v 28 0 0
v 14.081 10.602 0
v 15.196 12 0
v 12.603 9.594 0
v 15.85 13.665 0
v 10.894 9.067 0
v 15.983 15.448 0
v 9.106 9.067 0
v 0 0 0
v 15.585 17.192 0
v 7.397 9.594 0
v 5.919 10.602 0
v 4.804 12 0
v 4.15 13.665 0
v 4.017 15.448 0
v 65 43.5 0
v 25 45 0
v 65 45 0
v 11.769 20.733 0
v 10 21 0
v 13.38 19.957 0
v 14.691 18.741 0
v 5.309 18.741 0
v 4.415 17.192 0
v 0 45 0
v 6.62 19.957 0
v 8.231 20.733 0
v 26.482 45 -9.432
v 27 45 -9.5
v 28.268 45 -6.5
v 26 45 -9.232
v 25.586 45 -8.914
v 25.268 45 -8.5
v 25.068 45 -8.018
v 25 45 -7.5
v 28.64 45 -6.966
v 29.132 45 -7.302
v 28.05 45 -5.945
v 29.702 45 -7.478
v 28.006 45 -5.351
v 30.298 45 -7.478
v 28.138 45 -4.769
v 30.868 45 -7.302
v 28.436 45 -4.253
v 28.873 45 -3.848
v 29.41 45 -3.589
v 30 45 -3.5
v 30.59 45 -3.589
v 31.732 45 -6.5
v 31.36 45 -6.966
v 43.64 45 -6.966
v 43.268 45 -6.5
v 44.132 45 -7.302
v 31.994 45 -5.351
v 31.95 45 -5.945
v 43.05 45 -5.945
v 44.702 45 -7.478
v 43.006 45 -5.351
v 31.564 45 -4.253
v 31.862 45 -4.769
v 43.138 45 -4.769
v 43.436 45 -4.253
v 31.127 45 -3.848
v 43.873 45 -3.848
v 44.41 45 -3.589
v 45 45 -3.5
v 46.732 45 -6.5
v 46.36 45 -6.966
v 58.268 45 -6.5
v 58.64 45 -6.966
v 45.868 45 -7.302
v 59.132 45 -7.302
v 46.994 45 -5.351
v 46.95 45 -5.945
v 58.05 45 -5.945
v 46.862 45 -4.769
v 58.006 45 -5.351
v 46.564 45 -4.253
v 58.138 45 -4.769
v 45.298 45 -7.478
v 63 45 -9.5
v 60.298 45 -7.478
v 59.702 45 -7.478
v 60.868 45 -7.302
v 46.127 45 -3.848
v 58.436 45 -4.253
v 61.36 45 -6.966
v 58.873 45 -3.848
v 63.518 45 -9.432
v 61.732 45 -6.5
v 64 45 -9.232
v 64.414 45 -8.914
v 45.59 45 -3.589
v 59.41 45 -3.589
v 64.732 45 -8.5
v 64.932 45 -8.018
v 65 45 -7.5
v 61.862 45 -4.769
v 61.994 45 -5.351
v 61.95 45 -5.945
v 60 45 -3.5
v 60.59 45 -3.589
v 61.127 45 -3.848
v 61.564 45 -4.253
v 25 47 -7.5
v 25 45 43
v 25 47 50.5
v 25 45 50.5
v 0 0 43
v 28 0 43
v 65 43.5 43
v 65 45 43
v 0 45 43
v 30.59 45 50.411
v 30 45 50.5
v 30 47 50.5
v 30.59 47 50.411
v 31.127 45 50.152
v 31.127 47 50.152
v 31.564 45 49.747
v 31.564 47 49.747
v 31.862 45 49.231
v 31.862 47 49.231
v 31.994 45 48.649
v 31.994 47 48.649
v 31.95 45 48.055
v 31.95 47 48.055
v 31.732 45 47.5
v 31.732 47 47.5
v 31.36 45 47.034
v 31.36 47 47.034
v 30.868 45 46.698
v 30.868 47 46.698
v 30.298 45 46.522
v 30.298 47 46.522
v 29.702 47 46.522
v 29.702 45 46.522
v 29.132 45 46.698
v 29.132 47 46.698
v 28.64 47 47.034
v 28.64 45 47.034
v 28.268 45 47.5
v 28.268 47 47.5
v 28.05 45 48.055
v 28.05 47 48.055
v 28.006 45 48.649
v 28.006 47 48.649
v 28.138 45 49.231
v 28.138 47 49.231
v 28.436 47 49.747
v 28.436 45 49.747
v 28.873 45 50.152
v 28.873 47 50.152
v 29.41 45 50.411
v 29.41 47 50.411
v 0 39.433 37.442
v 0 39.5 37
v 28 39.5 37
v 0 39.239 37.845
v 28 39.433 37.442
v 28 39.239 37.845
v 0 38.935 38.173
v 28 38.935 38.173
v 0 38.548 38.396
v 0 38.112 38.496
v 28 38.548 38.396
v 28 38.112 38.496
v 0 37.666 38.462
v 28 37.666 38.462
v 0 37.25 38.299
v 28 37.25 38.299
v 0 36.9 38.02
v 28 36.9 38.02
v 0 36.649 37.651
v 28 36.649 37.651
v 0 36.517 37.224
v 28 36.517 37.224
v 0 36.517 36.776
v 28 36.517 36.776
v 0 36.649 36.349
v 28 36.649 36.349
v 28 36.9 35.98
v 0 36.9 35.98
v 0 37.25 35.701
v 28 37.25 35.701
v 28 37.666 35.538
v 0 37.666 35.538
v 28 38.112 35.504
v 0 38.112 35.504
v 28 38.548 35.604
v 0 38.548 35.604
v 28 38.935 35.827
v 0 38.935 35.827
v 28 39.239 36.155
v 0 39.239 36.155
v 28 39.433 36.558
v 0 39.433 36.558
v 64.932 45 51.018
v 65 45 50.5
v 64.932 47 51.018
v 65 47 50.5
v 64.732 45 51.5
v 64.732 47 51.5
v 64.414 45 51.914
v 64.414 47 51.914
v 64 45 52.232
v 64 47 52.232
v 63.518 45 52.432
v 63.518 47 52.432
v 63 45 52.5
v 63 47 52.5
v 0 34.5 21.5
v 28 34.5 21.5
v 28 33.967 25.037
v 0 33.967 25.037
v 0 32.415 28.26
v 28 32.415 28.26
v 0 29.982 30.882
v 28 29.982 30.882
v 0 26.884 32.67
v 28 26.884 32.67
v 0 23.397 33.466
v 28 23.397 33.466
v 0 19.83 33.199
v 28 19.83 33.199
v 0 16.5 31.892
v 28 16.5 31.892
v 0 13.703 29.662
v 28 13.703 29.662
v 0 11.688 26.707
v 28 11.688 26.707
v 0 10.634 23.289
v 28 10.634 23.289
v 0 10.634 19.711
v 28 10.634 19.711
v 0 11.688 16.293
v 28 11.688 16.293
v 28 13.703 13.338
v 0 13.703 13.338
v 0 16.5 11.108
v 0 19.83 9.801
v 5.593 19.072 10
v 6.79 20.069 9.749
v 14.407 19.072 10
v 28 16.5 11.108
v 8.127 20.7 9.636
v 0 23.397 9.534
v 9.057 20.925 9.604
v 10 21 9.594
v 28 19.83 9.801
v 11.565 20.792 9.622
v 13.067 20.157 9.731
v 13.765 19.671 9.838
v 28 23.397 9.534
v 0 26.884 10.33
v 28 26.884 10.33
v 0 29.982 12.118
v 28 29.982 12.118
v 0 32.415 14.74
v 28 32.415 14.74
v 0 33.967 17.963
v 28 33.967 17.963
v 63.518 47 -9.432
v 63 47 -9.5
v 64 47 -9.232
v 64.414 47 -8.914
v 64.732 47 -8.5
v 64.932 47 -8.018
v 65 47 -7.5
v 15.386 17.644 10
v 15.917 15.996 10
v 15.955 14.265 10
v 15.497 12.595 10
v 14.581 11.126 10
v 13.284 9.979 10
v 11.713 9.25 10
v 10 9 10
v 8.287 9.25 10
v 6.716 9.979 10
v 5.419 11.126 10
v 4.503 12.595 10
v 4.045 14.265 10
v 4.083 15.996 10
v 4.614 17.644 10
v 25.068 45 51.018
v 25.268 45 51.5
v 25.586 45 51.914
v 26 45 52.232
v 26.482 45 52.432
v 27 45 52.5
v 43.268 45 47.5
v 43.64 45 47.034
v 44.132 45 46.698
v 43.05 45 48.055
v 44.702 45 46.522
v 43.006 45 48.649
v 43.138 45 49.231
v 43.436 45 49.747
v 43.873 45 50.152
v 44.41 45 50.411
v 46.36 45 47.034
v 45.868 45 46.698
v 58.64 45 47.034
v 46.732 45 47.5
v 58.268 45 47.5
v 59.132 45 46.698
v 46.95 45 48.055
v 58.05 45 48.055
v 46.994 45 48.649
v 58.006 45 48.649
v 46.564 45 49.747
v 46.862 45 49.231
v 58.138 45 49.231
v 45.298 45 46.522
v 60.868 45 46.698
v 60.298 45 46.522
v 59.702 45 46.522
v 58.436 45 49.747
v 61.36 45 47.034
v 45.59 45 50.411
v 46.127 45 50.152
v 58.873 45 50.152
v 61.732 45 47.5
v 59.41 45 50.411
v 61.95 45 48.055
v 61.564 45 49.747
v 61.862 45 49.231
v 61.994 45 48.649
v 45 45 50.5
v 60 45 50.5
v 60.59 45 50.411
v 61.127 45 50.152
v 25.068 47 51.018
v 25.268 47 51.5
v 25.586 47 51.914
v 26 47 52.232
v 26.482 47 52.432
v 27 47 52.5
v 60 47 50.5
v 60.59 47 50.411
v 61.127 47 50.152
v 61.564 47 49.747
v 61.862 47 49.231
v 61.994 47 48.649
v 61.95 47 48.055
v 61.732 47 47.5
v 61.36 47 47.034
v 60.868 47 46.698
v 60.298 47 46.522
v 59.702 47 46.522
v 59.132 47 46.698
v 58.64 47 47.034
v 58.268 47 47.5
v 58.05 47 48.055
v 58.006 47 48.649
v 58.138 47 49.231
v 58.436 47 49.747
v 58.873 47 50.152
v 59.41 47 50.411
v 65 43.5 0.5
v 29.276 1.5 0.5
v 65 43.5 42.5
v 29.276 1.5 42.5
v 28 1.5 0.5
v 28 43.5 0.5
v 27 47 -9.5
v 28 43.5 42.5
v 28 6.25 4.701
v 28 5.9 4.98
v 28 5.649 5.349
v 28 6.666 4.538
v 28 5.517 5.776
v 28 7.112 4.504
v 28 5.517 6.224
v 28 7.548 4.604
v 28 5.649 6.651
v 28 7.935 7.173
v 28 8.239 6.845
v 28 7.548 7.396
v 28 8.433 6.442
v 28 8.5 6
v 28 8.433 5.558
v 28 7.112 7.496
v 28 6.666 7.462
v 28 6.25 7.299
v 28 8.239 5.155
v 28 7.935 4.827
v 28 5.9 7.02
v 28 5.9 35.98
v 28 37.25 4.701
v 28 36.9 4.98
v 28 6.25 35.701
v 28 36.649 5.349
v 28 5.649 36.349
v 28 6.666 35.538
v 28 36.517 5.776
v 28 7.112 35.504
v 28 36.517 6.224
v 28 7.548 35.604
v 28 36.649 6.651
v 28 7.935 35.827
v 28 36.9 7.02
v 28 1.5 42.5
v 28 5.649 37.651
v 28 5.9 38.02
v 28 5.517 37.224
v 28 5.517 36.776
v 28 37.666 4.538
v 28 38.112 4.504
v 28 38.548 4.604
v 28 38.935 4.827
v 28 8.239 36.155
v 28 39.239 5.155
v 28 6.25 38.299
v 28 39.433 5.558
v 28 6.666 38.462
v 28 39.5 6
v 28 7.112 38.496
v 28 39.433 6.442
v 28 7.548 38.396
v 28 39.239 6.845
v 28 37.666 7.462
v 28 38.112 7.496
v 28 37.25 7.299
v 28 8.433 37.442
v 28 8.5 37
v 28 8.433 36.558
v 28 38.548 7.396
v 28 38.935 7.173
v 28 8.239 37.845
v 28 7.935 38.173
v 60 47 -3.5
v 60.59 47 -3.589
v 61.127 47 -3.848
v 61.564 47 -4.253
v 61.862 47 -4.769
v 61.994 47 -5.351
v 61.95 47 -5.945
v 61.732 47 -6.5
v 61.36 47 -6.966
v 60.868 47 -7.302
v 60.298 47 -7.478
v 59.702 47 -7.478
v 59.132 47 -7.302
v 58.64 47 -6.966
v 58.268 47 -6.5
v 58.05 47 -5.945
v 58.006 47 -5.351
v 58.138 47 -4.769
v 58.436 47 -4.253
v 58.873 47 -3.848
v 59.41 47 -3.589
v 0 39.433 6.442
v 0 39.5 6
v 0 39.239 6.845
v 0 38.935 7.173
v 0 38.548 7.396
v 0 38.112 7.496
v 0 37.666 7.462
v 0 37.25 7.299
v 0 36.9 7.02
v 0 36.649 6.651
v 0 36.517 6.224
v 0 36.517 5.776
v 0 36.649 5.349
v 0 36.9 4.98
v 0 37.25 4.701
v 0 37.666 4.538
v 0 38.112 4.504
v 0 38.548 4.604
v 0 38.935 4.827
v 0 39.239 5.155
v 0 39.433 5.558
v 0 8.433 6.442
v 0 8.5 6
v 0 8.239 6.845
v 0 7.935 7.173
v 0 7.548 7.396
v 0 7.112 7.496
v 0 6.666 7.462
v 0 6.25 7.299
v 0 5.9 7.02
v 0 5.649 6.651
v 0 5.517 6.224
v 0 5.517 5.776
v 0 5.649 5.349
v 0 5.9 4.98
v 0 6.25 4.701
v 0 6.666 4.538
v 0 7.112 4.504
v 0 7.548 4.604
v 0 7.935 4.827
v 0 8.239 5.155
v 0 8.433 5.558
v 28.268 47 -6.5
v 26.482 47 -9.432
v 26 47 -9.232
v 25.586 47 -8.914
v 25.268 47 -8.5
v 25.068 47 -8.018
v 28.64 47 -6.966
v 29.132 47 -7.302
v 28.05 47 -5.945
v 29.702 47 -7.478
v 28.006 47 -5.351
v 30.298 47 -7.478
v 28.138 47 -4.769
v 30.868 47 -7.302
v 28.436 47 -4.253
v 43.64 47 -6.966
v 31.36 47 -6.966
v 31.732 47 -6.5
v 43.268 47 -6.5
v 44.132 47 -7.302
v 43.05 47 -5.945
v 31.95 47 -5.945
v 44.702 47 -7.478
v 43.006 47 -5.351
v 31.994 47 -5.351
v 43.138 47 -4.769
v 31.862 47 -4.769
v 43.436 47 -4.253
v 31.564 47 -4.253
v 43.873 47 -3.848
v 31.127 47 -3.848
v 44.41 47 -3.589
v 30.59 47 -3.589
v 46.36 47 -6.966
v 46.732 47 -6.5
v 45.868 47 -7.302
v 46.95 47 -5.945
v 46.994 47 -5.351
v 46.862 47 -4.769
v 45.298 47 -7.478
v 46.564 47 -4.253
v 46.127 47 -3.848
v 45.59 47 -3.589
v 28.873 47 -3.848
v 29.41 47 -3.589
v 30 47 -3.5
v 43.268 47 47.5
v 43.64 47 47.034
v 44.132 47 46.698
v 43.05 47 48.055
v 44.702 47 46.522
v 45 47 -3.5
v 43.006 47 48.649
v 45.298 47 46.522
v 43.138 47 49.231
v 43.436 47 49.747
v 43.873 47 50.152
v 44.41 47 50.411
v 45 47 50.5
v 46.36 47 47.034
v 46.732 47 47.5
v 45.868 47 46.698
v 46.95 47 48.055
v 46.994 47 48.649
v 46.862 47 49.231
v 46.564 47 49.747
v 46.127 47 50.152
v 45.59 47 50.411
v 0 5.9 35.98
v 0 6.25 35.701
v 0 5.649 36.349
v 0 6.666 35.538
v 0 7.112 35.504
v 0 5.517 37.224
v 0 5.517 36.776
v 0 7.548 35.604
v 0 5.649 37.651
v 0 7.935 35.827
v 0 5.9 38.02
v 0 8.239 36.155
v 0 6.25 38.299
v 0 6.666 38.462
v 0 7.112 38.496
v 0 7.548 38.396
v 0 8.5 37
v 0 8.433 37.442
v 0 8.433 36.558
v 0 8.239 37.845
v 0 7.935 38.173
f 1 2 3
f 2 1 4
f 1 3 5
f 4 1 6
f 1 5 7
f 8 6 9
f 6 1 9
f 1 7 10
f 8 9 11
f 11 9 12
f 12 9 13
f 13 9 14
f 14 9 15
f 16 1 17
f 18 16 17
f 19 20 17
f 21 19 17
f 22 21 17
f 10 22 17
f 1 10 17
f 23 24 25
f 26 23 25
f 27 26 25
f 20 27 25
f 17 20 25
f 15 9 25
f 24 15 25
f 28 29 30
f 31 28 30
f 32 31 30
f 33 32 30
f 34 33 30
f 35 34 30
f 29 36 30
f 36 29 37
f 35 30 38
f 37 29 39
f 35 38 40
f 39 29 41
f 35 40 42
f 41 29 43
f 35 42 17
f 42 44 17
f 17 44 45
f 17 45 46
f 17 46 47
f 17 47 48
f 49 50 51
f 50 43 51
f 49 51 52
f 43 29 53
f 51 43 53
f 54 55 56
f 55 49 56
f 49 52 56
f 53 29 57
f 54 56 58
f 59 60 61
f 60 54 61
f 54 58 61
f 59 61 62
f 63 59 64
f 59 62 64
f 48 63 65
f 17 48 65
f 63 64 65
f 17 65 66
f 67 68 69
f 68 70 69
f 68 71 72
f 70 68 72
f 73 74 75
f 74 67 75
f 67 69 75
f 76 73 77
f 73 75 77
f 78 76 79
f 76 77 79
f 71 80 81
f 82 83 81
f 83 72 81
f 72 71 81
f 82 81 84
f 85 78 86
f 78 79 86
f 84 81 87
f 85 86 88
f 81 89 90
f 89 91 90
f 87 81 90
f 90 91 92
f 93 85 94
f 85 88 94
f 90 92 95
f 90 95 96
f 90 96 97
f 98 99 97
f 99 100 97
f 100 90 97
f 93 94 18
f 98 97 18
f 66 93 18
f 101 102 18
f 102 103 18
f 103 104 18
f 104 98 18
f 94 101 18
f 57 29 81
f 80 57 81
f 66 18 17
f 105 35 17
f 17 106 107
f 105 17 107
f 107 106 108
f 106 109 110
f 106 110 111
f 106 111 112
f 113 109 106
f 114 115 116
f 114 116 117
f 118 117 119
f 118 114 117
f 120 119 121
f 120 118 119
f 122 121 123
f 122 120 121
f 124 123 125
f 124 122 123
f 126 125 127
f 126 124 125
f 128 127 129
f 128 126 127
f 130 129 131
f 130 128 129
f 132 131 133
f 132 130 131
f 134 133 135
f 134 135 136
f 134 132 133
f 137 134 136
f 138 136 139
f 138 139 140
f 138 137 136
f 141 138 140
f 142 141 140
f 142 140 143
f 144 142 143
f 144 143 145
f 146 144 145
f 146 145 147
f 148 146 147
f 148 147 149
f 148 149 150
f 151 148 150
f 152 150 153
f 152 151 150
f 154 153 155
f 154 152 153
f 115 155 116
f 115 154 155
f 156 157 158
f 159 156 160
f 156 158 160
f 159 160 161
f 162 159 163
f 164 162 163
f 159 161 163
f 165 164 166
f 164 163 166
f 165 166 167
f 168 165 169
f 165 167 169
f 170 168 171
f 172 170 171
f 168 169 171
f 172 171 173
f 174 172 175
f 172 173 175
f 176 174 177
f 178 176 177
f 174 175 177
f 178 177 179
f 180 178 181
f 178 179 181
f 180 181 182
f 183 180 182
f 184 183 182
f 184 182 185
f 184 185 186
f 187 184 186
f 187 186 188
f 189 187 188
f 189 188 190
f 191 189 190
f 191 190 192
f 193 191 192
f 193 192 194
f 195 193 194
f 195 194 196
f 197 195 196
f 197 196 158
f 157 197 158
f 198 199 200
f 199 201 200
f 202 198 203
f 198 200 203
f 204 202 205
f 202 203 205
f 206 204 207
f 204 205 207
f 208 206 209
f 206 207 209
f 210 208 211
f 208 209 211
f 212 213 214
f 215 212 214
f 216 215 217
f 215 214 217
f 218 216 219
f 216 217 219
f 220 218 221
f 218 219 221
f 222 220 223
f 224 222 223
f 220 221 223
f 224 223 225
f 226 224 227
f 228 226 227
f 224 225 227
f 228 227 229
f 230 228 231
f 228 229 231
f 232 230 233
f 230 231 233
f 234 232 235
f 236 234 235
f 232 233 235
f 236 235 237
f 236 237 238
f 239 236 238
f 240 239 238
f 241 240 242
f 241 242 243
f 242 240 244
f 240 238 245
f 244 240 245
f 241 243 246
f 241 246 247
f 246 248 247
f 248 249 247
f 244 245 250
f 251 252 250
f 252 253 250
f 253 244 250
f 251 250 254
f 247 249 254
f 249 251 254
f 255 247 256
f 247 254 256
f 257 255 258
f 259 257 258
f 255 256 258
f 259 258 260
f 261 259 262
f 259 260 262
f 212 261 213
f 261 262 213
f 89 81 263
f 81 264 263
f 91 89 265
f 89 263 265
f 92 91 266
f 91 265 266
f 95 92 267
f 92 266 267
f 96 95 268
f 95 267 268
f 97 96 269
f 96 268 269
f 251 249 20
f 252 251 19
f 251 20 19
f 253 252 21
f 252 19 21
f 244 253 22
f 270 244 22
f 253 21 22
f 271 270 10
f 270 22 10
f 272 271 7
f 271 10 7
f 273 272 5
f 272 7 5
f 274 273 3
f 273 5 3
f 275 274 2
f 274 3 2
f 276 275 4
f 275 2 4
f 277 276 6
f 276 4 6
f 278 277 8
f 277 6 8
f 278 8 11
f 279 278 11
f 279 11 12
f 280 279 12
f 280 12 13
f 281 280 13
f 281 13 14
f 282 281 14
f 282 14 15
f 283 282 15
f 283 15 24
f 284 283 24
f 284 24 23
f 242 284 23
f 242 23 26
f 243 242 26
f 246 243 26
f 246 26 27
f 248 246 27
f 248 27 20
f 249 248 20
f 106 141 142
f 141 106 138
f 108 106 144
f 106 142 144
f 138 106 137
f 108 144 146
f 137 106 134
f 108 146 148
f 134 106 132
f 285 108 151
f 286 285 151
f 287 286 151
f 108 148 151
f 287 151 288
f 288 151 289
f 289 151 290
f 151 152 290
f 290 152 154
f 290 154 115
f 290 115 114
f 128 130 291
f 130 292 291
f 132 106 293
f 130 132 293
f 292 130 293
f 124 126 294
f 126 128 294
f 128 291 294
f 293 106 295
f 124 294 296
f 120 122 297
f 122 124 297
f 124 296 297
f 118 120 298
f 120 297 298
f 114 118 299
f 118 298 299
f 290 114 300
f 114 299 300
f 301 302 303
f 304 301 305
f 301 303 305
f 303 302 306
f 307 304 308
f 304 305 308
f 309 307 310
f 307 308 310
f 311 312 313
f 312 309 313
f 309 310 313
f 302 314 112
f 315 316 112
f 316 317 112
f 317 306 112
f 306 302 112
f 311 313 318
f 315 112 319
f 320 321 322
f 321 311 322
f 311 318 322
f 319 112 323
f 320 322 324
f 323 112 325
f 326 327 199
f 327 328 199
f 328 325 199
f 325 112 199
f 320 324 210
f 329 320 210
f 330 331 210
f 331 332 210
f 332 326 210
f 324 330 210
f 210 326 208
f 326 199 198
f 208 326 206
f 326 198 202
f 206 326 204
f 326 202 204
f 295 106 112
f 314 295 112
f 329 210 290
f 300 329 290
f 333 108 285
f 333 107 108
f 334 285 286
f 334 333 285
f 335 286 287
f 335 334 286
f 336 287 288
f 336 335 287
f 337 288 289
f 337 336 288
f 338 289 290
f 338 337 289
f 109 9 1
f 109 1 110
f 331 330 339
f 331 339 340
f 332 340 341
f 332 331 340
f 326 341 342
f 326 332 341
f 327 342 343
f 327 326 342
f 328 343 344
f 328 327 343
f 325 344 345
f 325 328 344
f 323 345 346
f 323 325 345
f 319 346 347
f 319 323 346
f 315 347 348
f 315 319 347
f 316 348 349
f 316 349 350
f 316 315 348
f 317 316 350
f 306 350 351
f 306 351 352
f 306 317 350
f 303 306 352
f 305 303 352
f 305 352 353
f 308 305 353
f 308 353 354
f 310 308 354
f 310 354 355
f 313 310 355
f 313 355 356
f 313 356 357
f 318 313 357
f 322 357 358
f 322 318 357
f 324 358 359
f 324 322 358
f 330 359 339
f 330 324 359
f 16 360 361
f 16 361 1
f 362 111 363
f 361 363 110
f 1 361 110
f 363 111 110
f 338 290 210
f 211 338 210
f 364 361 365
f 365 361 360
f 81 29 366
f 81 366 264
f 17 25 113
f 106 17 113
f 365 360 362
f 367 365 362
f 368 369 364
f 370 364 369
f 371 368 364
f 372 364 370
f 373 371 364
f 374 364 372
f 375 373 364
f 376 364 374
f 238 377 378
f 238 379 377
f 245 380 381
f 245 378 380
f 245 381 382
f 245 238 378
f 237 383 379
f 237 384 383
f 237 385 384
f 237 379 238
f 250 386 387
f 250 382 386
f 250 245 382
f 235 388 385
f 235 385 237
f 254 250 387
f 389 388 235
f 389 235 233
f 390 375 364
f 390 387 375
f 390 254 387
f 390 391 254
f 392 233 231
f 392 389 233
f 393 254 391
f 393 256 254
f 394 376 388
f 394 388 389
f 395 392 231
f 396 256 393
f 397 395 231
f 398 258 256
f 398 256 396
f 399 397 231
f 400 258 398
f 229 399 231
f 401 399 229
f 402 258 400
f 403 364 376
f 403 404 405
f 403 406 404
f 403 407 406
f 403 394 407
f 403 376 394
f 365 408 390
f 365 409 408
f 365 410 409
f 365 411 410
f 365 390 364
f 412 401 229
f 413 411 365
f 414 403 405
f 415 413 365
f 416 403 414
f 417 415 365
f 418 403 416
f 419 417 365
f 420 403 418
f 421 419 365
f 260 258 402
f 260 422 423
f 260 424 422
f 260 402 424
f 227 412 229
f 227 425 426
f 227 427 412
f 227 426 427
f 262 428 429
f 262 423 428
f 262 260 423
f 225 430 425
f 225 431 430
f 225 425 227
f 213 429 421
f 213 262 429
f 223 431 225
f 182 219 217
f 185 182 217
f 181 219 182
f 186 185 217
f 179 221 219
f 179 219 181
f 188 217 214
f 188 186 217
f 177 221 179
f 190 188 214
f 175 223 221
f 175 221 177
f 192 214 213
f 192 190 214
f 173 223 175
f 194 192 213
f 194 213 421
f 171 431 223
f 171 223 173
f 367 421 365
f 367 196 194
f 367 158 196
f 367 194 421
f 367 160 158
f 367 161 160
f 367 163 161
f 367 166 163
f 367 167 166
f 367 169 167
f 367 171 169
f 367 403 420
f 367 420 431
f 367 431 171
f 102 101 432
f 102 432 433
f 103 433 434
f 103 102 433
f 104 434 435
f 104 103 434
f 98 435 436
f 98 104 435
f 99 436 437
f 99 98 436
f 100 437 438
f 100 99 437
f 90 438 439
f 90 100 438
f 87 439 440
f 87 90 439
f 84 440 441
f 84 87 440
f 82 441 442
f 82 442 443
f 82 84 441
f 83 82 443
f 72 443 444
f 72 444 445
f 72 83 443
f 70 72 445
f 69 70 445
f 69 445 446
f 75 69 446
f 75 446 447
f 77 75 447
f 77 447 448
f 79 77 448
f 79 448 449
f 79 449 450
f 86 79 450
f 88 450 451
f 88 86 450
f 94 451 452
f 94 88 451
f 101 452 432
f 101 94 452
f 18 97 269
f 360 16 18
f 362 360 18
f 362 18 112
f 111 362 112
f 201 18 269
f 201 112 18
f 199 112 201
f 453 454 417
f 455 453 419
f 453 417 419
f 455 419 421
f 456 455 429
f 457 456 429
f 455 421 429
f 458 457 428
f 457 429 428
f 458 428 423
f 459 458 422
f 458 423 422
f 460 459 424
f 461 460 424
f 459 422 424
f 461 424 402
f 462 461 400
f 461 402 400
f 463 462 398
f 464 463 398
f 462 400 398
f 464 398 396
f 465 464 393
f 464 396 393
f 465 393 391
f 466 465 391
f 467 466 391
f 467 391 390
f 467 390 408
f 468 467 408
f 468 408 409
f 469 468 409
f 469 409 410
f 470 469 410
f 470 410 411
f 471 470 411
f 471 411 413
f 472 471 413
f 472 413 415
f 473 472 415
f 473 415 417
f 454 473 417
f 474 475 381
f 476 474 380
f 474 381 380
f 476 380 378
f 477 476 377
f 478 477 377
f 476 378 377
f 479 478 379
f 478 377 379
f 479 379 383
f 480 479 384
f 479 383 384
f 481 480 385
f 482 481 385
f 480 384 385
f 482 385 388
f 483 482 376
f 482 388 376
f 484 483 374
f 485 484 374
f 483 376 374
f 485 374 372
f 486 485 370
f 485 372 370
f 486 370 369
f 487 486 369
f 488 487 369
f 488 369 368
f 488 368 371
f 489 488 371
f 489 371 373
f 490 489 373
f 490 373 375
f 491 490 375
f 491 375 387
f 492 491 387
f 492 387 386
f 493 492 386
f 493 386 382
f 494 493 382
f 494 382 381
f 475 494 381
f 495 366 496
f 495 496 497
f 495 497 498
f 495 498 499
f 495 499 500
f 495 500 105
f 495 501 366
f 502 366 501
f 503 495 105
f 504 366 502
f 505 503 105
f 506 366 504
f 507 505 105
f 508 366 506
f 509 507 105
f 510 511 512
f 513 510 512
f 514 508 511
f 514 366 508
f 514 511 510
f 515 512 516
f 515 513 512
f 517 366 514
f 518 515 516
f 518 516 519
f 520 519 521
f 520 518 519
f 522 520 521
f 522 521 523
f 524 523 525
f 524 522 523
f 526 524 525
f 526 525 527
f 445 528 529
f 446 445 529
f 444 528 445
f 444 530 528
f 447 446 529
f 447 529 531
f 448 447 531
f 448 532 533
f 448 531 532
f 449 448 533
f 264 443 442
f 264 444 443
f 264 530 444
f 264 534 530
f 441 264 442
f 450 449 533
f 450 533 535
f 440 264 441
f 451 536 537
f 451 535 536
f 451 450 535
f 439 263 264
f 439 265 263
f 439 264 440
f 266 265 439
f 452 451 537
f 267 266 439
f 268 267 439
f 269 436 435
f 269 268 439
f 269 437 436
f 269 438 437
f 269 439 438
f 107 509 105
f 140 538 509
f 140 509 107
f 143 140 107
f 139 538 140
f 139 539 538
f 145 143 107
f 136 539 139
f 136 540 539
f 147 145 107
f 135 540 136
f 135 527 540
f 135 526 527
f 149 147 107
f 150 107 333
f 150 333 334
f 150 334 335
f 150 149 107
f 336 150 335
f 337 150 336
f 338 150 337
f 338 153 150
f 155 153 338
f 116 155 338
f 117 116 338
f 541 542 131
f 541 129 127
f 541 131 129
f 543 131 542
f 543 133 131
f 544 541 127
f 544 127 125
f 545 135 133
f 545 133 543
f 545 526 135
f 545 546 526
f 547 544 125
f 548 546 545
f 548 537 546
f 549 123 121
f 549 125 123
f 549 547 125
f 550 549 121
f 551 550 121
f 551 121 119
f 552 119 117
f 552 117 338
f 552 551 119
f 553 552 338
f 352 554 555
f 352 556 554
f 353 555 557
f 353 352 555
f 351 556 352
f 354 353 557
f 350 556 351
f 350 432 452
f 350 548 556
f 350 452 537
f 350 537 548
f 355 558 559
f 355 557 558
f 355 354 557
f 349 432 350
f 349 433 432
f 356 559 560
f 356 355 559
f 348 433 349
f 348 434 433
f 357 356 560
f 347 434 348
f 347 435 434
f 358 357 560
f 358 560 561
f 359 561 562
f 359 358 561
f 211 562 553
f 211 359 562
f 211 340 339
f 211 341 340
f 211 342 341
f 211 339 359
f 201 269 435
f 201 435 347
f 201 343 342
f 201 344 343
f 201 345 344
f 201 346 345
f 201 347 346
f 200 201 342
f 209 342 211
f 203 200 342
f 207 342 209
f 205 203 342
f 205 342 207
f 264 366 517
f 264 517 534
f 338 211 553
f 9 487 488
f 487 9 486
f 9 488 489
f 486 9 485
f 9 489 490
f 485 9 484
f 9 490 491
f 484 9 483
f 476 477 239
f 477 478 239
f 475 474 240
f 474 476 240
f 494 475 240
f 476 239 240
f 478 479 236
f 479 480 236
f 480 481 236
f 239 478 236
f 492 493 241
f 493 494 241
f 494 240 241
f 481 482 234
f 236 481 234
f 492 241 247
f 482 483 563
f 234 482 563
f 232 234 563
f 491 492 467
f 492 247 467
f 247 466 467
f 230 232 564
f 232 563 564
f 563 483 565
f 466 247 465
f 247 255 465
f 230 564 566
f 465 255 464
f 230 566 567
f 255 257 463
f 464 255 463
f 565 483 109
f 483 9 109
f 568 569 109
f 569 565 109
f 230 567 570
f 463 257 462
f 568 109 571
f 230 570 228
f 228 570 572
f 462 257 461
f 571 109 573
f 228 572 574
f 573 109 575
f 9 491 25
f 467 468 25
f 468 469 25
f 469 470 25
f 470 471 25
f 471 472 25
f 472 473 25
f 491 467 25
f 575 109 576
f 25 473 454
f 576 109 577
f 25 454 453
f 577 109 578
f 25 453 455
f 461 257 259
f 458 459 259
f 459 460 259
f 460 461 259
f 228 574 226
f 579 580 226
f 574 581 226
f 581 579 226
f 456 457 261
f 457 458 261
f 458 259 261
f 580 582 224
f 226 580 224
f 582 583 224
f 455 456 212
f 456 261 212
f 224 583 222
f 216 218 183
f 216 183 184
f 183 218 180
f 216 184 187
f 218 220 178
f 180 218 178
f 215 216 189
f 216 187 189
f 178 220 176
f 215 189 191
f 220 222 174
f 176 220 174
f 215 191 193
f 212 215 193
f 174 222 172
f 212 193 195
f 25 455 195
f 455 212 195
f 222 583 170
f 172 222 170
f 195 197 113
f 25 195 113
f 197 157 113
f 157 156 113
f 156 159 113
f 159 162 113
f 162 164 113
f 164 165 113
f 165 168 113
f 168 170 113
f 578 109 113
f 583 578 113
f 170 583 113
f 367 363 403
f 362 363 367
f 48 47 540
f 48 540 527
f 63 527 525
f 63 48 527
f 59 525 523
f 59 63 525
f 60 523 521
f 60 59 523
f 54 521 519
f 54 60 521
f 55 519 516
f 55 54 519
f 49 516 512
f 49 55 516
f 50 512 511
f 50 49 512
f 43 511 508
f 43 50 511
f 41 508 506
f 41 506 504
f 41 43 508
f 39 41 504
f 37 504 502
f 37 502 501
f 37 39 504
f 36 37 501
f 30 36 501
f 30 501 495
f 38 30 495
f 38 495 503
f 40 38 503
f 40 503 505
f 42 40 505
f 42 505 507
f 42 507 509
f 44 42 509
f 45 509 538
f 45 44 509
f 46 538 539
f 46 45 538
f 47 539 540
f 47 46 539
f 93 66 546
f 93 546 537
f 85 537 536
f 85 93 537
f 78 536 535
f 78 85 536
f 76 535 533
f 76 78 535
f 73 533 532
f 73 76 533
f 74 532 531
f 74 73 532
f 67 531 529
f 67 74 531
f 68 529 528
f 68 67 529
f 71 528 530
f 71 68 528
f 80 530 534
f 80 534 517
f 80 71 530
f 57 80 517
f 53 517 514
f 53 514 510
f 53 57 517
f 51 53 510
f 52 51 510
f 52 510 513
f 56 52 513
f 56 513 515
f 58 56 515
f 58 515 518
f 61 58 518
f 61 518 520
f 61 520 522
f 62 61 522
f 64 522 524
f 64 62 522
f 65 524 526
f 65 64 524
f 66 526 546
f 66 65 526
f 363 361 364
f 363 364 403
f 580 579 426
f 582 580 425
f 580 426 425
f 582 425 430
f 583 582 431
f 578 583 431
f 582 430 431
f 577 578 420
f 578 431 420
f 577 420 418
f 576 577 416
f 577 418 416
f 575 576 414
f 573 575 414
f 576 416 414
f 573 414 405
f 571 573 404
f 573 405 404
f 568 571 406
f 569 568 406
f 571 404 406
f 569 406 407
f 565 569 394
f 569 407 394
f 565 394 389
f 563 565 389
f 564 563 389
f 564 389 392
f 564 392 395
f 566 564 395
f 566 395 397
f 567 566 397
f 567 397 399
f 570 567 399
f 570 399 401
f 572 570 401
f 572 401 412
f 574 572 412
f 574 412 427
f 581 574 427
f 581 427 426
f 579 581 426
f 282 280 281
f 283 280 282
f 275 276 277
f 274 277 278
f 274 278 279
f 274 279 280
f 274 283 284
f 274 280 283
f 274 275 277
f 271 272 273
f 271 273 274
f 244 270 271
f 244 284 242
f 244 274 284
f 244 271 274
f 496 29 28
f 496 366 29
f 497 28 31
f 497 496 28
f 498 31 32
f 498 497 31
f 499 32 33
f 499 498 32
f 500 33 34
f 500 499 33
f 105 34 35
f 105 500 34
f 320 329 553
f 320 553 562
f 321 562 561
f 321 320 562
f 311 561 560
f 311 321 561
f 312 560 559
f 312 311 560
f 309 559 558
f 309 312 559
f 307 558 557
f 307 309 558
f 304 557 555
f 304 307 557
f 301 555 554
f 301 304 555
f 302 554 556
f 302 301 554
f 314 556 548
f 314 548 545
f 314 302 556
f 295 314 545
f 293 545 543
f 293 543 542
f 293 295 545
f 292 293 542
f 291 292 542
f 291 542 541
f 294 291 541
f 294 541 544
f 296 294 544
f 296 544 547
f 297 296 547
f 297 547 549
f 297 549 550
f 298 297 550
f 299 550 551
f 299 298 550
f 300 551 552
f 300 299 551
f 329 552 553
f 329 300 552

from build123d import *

# Parameters (mm, degrees)
SKETCH_W        = 45
SKETCH_H        = 43
PAD_DEPTH       = 65
SKETCH001_W     = 42
SKETCH001_H     = 42
POCKET_DEPTH    = 37
POCKET001_DEPTH = 43.001
SKETCH003_R     = 12
SKETCH003_R_2   = 1.5
POCKET002_DEPTH = 28.001
SKETCH004_R     = 6
POCKET003_DEPTH = 10
SKETCH005_W     = 62
SKETCH005_H     = 40
SKETCH005_R     = 2
PAD001_DEPTH    = 2
FILLET_R        = 2


with BuildPart() as part:
    # Sketch → Pad (new body)
    with BuildSketch(Plane.YZ):
        with Locations((22.5, 21.5)):
            Rectangle(SKETCH_W, SKETCH_H)
    extrude(amount=PAD_DEPTH)

    # Sketch001 (on Face6 of Pad) → Pocket (cut)
    with BuildSketch(Plane.YZ.offset(65)):
        with Locations((22.5, 21.5)):
            Rectangle(SKETCH001_W, SKETCH001_H)
    extrude(amount=-POCKET_DEPTH, mode=Mode.SUBTRACT)

    # Sketch002 (on Face6 of Pocket) → Pocket001 (cut, through all)
    with BuildSketch(Plane(origin=(0, 0, 43), x_dir=(0, -1, 0), z_dir=(0, 0, 1))):
        Polygon((-43.5, 65), (0, 28), (0, 65), align=None)
    extrude(amount=-POCKET001_DEPTH, mode=Mode.SUBTRACT)

    # Sketch003 (on Face12 of Pocket001) → Pocket002 (cut, through all)
    with BuildSketch(Plane.YZ.offset(28)):
        with Locations((22.5, 21.5)):
            Circle(SKETCH003_R)
        with Locations((7, 37)):
            Circle(SKETCH003_R_2)
        with Locations((38, 37)):
            Circle(SKETCH003_R_2)
        with Locations((7, 6)):
            Circle(SKETCH003_R_2)
        with Locations((38, 6)):
            Circle(SKETCH003_R_2)
    extrude(amount=-POCKET002_DEPTH, mode=Mode.SUBTRACT)

    # Sketch004 (on Face1 of Pocket002) → Pocket003 (cut)
    with BuildSketch(Plane.YX):
        with Locations((15, 10)):
            Circle(SKETCH004_R)
    extrude(amount=-POCKET003_DEPTH, mode=Mode.SUBTRACT)

    # Sketch005 (on Face4 of Pocket003) → Pad001 (join)
    with BuildSketch(Plane.ZX.offset(45)):
        with Locations((21.5, 45)):
            Rectangle(SKETCH005_W, SKETCH005_H)
        with Locations((-5.5, 60)):
            Circle(SKETCH005_R, mode=Mode.SUBTRACT)
        with Locations((-5.5, 45)):
            Circle(SKETCH005_R, mode=Mode.SUBTRACT)
        with Locations((-5.5, 30)):
            Circle(SKETCH005_R, mode=Mode.SUBTRACT)
        with Locations((48.5, 60)):
            Circle(SKETCH005_R, mode=Mode.SUBTRACT)
        with Locations((48.5, 45)):
            Circle(SKETCH005_R, mode=Mode.SUBTRACT)
        with Locations((48.5, 30)):
            Circle(SKETCH005_R, mode=Mode.SUBTRACT)
    extrude(amount=PAD001_DEPTH)

    # Fillet
    fillet_edges = [part.edges().sort_by_distance(p)[0] for p in [
        (65, 46, 52.5),
        (25, 46, 52.5),
        (65, 46, -9.5),
        (25, 46, -9.5),
    ]]
    fillet(fillet_edges, radius=FILLET_R)


solid = part.part
